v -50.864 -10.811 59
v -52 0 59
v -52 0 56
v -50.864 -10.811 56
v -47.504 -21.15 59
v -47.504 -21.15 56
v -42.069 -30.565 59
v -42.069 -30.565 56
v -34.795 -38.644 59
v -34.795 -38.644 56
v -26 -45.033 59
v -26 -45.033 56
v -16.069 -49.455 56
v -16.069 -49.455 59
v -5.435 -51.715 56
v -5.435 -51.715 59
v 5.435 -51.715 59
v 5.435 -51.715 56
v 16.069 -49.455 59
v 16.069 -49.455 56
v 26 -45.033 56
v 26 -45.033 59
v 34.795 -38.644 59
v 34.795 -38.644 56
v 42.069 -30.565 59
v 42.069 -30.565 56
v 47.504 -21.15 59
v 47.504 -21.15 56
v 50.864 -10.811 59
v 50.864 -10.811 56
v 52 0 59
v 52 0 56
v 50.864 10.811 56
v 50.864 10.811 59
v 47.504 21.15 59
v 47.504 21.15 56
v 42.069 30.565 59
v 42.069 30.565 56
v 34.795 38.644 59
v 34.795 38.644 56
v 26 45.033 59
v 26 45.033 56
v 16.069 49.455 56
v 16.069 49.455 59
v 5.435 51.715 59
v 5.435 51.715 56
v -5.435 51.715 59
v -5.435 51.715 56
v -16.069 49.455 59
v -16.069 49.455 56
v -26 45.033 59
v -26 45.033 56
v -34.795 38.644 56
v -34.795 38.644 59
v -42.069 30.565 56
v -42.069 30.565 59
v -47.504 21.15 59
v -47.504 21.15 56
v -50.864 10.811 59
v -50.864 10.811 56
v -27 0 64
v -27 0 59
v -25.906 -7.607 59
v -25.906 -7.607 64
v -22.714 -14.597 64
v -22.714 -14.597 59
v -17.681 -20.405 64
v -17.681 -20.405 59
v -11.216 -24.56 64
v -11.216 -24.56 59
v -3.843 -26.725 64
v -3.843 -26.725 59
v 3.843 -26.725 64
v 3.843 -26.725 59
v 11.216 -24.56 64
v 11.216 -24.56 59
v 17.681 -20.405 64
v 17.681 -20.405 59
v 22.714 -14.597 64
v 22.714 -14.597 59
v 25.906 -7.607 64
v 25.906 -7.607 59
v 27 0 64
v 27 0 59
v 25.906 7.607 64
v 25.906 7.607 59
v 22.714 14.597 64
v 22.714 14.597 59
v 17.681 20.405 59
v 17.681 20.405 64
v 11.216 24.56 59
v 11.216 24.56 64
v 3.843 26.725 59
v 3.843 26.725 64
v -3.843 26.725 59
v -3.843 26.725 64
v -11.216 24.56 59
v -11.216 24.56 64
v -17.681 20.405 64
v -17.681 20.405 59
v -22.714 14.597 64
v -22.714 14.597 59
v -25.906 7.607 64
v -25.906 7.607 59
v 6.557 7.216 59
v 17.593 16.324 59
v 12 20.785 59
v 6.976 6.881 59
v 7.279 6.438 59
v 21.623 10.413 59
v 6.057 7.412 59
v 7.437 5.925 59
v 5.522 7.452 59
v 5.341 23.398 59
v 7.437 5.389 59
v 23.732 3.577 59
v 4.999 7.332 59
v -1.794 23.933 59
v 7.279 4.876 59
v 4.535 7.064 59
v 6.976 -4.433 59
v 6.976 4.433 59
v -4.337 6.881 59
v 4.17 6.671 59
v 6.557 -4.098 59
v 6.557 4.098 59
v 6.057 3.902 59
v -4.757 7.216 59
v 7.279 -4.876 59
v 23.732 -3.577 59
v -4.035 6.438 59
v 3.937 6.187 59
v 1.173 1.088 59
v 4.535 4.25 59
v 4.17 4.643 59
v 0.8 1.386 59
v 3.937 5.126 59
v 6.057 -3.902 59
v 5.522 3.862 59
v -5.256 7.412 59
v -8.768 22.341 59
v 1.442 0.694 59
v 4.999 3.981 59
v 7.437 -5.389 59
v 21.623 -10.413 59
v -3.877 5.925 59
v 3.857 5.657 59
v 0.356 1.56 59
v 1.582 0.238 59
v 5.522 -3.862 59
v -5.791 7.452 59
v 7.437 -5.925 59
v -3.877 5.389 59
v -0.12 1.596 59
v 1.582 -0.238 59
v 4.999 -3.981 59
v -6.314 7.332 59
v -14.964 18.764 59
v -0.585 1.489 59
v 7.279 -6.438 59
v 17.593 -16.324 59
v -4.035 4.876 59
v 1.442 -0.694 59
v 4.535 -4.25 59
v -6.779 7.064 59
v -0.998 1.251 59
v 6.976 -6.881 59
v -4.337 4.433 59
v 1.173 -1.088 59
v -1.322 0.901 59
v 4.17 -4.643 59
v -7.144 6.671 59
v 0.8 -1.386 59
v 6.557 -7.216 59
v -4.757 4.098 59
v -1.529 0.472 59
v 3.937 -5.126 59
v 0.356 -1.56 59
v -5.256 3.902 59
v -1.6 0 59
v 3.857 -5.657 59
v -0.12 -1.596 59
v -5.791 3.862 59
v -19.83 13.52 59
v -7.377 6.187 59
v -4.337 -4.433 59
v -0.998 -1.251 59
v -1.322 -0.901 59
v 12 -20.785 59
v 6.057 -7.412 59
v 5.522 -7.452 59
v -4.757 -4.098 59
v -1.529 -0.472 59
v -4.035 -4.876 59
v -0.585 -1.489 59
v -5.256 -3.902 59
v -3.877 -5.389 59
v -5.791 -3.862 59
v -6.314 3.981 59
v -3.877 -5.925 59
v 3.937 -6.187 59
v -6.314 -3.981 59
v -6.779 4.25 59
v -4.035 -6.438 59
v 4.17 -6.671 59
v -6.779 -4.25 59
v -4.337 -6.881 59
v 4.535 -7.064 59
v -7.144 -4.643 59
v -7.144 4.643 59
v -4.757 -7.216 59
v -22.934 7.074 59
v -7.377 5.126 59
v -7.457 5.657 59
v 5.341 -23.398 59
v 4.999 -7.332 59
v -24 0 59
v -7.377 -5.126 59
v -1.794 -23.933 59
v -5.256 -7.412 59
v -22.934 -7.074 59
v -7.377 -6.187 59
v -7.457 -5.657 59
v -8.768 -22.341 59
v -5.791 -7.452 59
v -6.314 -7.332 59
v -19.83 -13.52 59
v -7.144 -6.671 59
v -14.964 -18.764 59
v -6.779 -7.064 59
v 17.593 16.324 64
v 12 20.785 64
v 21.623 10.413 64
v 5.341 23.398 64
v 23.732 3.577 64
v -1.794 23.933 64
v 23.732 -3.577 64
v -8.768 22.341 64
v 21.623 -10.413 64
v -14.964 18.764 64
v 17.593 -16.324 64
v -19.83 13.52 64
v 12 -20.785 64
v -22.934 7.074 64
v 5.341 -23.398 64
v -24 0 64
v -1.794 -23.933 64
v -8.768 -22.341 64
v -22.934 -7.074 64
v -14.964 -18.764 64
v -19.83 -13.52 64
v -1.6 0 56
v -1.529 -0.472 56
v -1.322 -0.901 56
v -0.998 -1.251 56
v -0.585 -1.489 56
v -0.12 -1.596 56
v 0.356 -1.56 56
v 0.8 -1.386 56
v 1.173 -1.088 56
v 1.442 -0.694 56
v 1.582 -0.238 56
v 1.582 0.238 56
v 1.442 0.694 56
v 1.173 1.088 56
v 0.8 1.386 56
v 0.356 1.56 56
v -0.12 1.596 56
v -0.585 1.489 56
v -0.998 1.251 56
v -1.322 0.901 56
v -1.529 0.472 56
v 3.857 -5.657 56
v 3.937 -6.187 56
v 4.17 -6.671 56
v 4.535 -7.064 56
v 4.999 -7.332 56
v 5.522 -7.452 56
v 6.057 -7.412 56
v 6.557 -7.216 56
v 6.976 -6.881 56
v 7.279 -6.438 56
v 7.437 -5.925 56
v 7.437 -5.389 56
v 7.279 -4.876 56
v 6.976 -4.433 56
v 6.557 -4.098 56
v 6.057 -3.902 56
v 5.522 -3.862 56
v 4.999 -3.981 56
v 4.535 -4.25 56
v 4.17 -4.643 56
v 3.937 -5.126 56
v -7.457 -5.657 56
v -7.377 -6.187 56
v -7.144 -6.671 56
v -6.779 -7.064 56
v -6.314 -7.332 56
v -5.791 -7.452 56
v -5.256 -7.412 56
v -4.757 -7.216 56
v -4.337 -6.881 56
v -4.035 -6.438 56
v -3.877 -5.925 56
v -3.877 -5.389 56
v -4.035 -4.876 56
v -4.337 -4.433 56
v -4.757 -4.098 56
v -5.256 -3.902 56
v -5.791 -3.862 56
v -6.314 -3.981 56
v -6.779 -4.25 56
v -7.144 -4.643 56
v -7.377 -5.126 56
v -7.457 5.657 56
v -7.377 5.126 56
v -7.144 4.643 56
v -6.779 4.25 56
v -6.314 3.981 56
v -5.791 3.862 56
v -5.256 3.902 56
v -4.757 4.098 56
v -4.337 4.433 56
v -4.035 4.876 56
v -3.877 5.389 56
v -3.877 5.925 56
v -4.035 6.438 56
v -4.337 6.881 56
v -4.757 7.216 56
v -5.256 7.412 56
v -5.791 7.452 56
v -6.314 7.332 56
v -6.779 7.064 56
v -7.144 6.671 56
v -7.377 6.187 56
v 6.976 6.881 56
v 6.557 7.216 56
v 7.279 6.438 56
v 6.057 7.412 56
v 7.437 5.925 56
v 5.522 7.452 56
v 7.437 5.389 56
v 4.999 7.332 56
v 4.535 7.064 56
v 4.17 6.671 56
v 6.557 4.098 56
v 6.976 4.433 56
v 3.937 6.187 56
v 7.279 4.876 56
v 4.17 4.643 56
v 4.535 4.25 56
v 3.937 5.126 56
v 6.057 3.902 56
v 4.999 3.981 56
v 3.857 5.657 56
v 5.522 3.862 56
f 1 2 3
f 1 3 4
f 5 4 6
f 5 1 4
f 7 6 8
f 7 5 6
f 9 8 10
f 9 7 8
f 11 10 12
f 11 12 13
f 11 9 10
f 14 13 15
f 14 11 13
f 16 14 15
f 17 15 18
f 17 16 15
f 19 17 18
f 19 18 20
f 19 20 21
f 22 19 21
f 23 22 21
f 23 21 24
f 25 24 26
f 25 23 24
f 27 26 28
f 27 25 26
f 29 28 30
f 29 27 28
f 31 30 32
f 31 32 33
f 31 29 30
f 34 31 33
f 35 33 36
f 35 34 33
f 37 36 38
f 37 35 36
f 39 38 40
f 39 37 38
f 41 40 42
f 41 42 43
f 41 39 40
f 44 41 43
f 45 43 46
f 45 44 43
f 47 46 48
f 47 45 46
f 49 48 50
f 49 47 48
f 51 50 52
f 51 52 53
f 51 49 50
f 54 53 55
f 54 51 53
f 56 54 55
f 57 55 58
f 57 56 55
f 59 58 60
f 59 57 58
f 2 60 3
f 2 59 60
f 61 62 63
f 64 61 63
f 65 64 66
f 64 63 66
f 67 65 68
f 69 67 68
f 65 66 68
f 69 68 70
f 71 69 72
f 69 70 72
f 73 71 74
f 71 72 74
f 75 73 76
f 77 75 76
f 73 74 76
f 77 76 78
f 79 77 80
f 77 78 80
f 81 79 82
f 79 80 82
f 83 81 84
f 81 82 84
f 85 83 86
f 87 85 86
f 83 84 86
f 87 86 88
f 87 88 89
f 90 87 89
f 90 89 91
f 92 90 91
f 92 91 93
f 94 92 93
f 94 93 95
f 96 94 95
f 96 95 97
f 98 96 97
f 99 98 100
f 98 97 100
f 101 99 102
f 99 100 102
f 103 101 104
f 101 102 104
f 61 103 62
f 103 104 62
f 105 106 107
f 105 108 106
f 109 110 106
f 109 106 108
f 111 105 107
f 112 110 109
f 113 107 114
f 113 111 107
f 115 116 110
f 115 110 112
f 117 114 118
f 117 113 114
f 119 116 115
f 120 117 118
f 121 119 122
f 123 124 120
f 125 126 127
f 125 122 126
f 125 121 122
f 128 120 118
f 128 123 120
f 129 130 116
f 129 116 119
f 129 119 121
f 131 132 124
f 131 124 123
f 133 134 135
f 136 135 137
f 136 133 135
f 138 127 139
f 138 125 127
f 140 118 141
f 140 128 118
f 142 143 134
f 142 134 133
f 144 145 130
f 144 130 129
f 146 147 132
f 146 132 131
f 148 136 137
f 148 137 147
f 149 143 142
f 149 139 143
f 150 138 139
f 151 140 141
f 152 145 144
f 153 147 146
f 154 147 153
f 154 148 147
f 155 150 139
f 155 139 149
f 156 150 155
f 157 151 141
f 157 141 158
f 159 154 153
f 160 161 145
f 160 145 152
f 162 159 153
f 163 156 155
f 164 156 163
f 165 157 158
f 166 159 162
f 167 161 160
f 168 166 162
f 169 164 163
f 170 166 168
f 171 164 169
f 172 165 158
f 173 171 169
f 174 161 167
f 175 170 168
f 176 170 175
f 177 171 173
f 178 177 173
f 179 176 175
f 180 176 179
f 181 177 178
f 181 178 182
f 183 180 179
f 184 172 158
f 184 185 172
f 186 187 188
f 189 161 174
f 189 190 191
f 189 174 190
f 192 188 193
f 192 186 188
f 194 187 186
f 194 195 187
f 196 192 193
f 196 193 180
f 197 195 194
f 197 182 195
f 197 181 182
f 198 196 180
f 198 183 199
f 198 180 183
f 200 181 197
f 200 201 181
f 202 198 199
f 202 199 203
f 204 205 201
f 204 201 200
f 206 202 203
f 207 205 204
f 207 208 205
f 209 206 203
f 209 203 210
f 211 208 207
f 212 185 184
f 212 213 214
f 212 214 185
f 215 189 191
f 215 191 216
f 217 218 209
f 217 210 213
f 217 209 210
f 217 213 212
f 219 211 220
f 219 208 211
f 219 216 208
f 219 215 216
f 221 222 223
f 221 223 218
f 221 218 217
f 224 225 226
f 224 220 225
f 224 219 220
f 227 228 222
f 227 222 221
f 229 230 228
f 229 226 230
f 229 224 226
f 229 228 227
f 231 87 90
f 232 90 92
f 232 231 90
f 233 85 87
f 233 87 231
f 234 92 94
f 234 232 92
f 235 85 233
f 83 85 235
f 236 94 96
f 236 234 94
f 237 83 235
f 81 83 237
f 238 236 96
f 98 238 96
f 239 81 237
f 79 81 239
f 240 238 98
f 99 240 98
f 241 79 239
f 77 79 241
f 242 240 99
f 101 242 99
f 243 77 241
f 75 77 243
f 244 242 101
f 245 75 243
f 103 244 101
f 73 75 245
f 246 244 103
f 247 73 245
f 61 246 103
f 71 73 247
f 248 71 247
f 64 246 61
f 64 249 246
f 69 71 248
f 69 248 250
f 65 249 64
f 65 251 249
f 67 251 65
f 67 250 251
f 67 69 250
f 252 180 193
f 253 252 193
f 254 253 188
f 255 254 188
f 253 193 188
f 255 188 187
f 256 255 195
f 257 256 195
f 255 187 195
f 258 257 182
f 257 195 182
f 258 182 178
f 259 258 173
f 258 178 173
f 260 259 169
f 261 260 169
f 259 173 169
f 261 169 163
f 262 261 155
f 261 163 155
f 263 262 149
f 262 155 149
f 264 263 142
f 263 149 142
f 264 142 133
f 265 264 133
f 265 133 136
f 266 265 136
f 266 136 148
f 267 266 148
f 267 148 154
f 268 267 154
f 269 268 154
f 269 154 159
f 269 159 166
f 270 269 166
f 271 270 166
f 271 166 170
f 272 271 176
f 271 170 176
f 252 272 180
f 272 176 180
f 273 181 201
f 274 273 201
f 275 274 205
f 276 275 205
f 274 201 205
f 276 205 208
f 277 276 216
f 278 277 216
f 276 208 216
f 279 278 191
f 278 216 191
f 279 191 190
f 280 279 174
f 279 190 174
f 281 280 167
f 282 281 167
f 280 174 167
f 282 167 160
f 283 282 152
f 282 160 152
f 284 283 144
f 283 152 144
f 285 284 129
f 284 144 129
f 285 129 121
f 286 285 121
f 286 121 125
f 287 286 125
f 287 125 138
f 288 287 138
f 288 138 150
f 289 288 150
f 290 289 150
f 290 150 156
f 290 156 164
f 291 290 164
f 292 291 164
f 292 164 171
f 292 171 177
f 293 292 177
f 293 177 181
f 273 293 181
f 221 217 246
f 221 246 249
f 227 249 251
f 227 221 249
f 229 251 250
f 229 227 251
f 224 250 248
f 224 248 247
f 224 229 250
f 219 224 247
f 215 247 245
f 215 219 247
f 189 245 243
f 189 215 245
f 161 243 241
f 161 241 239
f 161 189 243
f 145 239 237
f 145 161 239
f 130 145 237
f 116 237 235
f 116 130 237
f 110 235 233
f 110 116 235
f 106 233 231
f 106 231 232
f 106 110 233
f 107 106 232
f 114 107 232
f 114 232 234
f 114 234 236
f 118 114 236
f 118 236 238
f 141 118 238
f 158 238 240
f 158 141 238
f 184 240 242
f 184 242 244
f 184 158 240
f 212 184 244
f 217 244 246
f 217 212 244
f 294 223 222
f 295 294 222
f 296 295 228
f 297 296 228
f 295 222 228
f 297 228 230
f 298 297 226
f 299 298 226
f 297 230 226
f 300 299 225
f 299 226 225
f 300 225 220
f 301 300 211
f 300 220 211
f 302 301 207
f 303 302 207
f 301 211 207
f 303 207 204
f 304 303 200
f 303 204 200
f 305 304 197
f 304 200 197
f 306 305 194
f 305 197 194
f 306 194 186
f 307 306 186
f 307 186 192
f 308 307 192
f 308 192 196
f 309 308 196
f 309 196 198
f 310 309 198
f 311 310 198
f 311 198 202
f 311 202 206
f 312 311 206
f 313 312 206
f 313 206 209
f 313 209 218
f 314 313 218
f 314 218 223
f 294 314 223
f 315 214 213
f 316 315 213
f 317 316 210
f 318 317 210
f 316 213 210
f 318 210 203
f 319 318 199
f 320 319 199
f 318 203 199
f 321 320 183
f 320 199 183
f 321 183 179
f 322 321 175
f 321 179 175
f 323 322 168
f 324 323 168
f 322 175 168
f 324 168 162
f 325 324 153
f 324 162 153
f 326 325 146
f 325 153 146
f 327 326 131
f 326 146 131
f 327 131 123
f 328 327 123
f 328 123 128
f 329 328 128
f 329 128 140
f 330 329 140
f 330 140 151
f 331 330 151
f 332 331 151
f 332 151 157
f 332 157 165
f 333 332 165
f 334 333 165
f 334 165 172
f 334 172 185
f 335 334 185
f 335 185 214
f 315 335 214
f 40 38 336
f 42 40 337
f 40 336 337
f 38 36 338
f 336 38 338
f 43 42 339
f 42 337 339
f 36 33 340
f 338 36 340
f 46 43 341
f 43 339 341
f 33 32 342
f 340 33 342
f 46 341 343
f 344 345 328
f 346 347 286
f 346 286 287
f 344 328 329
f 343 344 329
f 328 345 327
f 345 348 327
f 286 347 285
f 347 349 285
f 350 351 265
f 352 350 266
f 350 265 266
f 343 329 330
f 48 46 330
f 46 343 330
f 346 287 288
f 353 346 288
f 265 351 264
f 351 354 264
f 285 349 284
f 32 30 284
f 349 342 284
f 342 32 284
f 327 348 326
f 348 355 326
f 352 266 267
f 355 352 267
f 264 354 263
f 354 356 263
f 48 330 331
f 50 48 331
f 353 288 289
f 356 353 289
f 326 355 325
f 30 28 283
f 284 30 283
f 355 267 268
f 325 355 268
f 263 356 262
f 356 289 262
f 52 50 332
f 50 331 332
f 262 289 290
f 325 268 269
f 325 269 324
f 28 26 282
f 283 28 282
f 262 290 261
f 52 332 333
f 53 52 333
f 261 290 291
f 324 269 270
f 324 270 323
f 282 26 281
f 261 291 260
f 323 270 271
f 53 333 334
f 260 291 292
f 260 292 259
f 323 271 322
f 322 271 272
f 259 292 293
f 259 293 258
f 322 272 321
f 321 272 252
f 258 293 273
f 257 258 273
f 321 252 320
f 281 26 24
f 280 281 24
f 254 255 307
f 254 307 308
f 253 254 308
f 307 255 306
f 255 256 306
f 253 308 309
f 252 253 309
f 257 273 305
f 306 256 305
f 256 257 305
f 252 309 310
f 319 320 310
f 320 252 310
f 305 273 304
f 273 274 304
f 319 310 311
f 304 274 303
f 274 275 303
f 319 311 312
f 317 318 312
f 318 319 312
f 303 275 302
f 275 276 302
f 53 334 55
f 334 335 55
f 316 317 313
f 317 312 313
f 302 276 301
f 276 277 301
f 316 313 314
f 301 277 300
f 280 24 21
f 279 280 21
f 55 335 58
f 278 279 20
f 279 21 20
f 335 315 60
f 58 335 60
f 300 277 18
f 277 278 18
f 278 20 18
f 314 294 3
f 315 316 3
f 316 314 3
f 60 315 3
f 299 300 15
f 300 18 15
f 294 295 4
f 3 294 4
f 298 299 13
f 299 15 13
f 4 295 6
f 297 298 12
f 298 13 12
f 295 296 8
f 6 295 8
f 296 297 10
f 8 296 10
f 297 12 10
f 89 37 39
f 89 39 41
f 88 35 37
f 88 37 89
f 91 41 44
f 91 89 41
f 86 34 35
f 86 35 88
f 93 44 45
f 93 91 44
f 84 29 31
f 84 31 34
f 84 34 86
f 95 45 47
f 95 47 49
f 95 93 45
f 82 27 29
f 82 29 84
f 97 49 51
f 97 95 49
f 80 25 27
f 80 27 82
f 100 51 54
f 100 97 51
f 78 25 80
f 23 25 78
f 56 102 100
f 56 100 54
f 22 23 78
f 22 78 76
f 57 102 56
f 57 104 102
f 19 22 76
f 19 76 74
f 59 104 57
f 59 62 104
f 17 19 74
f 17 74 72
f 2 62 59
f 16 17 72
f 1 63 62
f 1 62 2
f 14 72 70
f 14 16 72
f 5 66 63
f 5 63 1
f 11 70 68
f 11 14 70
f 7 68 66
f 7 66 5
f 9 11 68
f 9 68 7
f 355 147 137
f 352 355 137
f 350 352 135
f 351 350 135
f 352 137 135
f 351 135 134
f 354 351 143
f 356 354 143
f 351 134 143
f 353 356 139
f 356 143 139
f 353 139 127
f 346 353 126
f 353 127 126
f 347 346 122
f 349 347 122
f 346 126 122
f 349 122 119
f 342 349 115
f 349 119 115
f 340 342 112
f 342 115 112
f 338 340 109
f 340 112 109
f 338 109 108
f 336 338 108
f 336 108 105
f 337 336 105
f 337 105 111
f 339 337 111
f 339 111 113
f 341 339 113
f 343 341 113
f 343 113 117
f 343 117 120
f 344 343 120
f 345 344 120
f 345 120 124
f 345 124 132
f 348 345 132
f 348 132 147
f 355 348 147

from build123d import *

# Parameters (mm, degrees)
SKETCH001_R          = 52
SKETCH001_R_2        = 1.6
PAD001_DEPTH         = 3
SKETCH_R             = 27
SKETCH_R_2           = 24
PAD_DEPTH            = 5
SKETCH002_R          = 1.8
POCKET_DEPTH         = 5
BODY_PLACEMENT_ANGLE = 180


with BuildPart() as part:
    # Sketch001 → Pad001 (new body)
    with BuildSketch(Plane.XY):
        Circle(SKETCH001_R)
        Circle(SKETCH001_R_2, mode=Mode.SUBTRACT)
    extrude(amount=-PAD001_DEPTH)

    # Sketch → Pad (join)
    with BuildSketch(Plane.XY):
        Circle(SKETCH_R)
        Circle(SKETCH_R_2, mode=Mode.SUBTRACT)
    extrude(amount=PAD_DEPTH)

    # Sketch002 → Pocket (cut)
    with BuildSketch(Plane.XY):
        with Locations((5.656854, 5.656854)):
            Circle(SKETCH002_R)
        with Locations((-5.656854, 5.656854)):
            Circle(SKETCH002_R)
        with Locations((-5.656854, -5.656854)):
            Circle(SKETCH002_R)
        with Locations((5.656854, -5.656854)):
            Circle(SKETCH002_R)
    extrude(amount=-POCKET_DEPTH, mode=Mode.SUBTRACT)


with BuildPart() as part_1:
    # Body placement: moved
    add(part.part.moved(Location((0, 0, 59))).rotate(Axis((0, 0, 59), (0, 0, -1)), BODY_PLACEMENT_ANGLE))


solid = part_1.part
